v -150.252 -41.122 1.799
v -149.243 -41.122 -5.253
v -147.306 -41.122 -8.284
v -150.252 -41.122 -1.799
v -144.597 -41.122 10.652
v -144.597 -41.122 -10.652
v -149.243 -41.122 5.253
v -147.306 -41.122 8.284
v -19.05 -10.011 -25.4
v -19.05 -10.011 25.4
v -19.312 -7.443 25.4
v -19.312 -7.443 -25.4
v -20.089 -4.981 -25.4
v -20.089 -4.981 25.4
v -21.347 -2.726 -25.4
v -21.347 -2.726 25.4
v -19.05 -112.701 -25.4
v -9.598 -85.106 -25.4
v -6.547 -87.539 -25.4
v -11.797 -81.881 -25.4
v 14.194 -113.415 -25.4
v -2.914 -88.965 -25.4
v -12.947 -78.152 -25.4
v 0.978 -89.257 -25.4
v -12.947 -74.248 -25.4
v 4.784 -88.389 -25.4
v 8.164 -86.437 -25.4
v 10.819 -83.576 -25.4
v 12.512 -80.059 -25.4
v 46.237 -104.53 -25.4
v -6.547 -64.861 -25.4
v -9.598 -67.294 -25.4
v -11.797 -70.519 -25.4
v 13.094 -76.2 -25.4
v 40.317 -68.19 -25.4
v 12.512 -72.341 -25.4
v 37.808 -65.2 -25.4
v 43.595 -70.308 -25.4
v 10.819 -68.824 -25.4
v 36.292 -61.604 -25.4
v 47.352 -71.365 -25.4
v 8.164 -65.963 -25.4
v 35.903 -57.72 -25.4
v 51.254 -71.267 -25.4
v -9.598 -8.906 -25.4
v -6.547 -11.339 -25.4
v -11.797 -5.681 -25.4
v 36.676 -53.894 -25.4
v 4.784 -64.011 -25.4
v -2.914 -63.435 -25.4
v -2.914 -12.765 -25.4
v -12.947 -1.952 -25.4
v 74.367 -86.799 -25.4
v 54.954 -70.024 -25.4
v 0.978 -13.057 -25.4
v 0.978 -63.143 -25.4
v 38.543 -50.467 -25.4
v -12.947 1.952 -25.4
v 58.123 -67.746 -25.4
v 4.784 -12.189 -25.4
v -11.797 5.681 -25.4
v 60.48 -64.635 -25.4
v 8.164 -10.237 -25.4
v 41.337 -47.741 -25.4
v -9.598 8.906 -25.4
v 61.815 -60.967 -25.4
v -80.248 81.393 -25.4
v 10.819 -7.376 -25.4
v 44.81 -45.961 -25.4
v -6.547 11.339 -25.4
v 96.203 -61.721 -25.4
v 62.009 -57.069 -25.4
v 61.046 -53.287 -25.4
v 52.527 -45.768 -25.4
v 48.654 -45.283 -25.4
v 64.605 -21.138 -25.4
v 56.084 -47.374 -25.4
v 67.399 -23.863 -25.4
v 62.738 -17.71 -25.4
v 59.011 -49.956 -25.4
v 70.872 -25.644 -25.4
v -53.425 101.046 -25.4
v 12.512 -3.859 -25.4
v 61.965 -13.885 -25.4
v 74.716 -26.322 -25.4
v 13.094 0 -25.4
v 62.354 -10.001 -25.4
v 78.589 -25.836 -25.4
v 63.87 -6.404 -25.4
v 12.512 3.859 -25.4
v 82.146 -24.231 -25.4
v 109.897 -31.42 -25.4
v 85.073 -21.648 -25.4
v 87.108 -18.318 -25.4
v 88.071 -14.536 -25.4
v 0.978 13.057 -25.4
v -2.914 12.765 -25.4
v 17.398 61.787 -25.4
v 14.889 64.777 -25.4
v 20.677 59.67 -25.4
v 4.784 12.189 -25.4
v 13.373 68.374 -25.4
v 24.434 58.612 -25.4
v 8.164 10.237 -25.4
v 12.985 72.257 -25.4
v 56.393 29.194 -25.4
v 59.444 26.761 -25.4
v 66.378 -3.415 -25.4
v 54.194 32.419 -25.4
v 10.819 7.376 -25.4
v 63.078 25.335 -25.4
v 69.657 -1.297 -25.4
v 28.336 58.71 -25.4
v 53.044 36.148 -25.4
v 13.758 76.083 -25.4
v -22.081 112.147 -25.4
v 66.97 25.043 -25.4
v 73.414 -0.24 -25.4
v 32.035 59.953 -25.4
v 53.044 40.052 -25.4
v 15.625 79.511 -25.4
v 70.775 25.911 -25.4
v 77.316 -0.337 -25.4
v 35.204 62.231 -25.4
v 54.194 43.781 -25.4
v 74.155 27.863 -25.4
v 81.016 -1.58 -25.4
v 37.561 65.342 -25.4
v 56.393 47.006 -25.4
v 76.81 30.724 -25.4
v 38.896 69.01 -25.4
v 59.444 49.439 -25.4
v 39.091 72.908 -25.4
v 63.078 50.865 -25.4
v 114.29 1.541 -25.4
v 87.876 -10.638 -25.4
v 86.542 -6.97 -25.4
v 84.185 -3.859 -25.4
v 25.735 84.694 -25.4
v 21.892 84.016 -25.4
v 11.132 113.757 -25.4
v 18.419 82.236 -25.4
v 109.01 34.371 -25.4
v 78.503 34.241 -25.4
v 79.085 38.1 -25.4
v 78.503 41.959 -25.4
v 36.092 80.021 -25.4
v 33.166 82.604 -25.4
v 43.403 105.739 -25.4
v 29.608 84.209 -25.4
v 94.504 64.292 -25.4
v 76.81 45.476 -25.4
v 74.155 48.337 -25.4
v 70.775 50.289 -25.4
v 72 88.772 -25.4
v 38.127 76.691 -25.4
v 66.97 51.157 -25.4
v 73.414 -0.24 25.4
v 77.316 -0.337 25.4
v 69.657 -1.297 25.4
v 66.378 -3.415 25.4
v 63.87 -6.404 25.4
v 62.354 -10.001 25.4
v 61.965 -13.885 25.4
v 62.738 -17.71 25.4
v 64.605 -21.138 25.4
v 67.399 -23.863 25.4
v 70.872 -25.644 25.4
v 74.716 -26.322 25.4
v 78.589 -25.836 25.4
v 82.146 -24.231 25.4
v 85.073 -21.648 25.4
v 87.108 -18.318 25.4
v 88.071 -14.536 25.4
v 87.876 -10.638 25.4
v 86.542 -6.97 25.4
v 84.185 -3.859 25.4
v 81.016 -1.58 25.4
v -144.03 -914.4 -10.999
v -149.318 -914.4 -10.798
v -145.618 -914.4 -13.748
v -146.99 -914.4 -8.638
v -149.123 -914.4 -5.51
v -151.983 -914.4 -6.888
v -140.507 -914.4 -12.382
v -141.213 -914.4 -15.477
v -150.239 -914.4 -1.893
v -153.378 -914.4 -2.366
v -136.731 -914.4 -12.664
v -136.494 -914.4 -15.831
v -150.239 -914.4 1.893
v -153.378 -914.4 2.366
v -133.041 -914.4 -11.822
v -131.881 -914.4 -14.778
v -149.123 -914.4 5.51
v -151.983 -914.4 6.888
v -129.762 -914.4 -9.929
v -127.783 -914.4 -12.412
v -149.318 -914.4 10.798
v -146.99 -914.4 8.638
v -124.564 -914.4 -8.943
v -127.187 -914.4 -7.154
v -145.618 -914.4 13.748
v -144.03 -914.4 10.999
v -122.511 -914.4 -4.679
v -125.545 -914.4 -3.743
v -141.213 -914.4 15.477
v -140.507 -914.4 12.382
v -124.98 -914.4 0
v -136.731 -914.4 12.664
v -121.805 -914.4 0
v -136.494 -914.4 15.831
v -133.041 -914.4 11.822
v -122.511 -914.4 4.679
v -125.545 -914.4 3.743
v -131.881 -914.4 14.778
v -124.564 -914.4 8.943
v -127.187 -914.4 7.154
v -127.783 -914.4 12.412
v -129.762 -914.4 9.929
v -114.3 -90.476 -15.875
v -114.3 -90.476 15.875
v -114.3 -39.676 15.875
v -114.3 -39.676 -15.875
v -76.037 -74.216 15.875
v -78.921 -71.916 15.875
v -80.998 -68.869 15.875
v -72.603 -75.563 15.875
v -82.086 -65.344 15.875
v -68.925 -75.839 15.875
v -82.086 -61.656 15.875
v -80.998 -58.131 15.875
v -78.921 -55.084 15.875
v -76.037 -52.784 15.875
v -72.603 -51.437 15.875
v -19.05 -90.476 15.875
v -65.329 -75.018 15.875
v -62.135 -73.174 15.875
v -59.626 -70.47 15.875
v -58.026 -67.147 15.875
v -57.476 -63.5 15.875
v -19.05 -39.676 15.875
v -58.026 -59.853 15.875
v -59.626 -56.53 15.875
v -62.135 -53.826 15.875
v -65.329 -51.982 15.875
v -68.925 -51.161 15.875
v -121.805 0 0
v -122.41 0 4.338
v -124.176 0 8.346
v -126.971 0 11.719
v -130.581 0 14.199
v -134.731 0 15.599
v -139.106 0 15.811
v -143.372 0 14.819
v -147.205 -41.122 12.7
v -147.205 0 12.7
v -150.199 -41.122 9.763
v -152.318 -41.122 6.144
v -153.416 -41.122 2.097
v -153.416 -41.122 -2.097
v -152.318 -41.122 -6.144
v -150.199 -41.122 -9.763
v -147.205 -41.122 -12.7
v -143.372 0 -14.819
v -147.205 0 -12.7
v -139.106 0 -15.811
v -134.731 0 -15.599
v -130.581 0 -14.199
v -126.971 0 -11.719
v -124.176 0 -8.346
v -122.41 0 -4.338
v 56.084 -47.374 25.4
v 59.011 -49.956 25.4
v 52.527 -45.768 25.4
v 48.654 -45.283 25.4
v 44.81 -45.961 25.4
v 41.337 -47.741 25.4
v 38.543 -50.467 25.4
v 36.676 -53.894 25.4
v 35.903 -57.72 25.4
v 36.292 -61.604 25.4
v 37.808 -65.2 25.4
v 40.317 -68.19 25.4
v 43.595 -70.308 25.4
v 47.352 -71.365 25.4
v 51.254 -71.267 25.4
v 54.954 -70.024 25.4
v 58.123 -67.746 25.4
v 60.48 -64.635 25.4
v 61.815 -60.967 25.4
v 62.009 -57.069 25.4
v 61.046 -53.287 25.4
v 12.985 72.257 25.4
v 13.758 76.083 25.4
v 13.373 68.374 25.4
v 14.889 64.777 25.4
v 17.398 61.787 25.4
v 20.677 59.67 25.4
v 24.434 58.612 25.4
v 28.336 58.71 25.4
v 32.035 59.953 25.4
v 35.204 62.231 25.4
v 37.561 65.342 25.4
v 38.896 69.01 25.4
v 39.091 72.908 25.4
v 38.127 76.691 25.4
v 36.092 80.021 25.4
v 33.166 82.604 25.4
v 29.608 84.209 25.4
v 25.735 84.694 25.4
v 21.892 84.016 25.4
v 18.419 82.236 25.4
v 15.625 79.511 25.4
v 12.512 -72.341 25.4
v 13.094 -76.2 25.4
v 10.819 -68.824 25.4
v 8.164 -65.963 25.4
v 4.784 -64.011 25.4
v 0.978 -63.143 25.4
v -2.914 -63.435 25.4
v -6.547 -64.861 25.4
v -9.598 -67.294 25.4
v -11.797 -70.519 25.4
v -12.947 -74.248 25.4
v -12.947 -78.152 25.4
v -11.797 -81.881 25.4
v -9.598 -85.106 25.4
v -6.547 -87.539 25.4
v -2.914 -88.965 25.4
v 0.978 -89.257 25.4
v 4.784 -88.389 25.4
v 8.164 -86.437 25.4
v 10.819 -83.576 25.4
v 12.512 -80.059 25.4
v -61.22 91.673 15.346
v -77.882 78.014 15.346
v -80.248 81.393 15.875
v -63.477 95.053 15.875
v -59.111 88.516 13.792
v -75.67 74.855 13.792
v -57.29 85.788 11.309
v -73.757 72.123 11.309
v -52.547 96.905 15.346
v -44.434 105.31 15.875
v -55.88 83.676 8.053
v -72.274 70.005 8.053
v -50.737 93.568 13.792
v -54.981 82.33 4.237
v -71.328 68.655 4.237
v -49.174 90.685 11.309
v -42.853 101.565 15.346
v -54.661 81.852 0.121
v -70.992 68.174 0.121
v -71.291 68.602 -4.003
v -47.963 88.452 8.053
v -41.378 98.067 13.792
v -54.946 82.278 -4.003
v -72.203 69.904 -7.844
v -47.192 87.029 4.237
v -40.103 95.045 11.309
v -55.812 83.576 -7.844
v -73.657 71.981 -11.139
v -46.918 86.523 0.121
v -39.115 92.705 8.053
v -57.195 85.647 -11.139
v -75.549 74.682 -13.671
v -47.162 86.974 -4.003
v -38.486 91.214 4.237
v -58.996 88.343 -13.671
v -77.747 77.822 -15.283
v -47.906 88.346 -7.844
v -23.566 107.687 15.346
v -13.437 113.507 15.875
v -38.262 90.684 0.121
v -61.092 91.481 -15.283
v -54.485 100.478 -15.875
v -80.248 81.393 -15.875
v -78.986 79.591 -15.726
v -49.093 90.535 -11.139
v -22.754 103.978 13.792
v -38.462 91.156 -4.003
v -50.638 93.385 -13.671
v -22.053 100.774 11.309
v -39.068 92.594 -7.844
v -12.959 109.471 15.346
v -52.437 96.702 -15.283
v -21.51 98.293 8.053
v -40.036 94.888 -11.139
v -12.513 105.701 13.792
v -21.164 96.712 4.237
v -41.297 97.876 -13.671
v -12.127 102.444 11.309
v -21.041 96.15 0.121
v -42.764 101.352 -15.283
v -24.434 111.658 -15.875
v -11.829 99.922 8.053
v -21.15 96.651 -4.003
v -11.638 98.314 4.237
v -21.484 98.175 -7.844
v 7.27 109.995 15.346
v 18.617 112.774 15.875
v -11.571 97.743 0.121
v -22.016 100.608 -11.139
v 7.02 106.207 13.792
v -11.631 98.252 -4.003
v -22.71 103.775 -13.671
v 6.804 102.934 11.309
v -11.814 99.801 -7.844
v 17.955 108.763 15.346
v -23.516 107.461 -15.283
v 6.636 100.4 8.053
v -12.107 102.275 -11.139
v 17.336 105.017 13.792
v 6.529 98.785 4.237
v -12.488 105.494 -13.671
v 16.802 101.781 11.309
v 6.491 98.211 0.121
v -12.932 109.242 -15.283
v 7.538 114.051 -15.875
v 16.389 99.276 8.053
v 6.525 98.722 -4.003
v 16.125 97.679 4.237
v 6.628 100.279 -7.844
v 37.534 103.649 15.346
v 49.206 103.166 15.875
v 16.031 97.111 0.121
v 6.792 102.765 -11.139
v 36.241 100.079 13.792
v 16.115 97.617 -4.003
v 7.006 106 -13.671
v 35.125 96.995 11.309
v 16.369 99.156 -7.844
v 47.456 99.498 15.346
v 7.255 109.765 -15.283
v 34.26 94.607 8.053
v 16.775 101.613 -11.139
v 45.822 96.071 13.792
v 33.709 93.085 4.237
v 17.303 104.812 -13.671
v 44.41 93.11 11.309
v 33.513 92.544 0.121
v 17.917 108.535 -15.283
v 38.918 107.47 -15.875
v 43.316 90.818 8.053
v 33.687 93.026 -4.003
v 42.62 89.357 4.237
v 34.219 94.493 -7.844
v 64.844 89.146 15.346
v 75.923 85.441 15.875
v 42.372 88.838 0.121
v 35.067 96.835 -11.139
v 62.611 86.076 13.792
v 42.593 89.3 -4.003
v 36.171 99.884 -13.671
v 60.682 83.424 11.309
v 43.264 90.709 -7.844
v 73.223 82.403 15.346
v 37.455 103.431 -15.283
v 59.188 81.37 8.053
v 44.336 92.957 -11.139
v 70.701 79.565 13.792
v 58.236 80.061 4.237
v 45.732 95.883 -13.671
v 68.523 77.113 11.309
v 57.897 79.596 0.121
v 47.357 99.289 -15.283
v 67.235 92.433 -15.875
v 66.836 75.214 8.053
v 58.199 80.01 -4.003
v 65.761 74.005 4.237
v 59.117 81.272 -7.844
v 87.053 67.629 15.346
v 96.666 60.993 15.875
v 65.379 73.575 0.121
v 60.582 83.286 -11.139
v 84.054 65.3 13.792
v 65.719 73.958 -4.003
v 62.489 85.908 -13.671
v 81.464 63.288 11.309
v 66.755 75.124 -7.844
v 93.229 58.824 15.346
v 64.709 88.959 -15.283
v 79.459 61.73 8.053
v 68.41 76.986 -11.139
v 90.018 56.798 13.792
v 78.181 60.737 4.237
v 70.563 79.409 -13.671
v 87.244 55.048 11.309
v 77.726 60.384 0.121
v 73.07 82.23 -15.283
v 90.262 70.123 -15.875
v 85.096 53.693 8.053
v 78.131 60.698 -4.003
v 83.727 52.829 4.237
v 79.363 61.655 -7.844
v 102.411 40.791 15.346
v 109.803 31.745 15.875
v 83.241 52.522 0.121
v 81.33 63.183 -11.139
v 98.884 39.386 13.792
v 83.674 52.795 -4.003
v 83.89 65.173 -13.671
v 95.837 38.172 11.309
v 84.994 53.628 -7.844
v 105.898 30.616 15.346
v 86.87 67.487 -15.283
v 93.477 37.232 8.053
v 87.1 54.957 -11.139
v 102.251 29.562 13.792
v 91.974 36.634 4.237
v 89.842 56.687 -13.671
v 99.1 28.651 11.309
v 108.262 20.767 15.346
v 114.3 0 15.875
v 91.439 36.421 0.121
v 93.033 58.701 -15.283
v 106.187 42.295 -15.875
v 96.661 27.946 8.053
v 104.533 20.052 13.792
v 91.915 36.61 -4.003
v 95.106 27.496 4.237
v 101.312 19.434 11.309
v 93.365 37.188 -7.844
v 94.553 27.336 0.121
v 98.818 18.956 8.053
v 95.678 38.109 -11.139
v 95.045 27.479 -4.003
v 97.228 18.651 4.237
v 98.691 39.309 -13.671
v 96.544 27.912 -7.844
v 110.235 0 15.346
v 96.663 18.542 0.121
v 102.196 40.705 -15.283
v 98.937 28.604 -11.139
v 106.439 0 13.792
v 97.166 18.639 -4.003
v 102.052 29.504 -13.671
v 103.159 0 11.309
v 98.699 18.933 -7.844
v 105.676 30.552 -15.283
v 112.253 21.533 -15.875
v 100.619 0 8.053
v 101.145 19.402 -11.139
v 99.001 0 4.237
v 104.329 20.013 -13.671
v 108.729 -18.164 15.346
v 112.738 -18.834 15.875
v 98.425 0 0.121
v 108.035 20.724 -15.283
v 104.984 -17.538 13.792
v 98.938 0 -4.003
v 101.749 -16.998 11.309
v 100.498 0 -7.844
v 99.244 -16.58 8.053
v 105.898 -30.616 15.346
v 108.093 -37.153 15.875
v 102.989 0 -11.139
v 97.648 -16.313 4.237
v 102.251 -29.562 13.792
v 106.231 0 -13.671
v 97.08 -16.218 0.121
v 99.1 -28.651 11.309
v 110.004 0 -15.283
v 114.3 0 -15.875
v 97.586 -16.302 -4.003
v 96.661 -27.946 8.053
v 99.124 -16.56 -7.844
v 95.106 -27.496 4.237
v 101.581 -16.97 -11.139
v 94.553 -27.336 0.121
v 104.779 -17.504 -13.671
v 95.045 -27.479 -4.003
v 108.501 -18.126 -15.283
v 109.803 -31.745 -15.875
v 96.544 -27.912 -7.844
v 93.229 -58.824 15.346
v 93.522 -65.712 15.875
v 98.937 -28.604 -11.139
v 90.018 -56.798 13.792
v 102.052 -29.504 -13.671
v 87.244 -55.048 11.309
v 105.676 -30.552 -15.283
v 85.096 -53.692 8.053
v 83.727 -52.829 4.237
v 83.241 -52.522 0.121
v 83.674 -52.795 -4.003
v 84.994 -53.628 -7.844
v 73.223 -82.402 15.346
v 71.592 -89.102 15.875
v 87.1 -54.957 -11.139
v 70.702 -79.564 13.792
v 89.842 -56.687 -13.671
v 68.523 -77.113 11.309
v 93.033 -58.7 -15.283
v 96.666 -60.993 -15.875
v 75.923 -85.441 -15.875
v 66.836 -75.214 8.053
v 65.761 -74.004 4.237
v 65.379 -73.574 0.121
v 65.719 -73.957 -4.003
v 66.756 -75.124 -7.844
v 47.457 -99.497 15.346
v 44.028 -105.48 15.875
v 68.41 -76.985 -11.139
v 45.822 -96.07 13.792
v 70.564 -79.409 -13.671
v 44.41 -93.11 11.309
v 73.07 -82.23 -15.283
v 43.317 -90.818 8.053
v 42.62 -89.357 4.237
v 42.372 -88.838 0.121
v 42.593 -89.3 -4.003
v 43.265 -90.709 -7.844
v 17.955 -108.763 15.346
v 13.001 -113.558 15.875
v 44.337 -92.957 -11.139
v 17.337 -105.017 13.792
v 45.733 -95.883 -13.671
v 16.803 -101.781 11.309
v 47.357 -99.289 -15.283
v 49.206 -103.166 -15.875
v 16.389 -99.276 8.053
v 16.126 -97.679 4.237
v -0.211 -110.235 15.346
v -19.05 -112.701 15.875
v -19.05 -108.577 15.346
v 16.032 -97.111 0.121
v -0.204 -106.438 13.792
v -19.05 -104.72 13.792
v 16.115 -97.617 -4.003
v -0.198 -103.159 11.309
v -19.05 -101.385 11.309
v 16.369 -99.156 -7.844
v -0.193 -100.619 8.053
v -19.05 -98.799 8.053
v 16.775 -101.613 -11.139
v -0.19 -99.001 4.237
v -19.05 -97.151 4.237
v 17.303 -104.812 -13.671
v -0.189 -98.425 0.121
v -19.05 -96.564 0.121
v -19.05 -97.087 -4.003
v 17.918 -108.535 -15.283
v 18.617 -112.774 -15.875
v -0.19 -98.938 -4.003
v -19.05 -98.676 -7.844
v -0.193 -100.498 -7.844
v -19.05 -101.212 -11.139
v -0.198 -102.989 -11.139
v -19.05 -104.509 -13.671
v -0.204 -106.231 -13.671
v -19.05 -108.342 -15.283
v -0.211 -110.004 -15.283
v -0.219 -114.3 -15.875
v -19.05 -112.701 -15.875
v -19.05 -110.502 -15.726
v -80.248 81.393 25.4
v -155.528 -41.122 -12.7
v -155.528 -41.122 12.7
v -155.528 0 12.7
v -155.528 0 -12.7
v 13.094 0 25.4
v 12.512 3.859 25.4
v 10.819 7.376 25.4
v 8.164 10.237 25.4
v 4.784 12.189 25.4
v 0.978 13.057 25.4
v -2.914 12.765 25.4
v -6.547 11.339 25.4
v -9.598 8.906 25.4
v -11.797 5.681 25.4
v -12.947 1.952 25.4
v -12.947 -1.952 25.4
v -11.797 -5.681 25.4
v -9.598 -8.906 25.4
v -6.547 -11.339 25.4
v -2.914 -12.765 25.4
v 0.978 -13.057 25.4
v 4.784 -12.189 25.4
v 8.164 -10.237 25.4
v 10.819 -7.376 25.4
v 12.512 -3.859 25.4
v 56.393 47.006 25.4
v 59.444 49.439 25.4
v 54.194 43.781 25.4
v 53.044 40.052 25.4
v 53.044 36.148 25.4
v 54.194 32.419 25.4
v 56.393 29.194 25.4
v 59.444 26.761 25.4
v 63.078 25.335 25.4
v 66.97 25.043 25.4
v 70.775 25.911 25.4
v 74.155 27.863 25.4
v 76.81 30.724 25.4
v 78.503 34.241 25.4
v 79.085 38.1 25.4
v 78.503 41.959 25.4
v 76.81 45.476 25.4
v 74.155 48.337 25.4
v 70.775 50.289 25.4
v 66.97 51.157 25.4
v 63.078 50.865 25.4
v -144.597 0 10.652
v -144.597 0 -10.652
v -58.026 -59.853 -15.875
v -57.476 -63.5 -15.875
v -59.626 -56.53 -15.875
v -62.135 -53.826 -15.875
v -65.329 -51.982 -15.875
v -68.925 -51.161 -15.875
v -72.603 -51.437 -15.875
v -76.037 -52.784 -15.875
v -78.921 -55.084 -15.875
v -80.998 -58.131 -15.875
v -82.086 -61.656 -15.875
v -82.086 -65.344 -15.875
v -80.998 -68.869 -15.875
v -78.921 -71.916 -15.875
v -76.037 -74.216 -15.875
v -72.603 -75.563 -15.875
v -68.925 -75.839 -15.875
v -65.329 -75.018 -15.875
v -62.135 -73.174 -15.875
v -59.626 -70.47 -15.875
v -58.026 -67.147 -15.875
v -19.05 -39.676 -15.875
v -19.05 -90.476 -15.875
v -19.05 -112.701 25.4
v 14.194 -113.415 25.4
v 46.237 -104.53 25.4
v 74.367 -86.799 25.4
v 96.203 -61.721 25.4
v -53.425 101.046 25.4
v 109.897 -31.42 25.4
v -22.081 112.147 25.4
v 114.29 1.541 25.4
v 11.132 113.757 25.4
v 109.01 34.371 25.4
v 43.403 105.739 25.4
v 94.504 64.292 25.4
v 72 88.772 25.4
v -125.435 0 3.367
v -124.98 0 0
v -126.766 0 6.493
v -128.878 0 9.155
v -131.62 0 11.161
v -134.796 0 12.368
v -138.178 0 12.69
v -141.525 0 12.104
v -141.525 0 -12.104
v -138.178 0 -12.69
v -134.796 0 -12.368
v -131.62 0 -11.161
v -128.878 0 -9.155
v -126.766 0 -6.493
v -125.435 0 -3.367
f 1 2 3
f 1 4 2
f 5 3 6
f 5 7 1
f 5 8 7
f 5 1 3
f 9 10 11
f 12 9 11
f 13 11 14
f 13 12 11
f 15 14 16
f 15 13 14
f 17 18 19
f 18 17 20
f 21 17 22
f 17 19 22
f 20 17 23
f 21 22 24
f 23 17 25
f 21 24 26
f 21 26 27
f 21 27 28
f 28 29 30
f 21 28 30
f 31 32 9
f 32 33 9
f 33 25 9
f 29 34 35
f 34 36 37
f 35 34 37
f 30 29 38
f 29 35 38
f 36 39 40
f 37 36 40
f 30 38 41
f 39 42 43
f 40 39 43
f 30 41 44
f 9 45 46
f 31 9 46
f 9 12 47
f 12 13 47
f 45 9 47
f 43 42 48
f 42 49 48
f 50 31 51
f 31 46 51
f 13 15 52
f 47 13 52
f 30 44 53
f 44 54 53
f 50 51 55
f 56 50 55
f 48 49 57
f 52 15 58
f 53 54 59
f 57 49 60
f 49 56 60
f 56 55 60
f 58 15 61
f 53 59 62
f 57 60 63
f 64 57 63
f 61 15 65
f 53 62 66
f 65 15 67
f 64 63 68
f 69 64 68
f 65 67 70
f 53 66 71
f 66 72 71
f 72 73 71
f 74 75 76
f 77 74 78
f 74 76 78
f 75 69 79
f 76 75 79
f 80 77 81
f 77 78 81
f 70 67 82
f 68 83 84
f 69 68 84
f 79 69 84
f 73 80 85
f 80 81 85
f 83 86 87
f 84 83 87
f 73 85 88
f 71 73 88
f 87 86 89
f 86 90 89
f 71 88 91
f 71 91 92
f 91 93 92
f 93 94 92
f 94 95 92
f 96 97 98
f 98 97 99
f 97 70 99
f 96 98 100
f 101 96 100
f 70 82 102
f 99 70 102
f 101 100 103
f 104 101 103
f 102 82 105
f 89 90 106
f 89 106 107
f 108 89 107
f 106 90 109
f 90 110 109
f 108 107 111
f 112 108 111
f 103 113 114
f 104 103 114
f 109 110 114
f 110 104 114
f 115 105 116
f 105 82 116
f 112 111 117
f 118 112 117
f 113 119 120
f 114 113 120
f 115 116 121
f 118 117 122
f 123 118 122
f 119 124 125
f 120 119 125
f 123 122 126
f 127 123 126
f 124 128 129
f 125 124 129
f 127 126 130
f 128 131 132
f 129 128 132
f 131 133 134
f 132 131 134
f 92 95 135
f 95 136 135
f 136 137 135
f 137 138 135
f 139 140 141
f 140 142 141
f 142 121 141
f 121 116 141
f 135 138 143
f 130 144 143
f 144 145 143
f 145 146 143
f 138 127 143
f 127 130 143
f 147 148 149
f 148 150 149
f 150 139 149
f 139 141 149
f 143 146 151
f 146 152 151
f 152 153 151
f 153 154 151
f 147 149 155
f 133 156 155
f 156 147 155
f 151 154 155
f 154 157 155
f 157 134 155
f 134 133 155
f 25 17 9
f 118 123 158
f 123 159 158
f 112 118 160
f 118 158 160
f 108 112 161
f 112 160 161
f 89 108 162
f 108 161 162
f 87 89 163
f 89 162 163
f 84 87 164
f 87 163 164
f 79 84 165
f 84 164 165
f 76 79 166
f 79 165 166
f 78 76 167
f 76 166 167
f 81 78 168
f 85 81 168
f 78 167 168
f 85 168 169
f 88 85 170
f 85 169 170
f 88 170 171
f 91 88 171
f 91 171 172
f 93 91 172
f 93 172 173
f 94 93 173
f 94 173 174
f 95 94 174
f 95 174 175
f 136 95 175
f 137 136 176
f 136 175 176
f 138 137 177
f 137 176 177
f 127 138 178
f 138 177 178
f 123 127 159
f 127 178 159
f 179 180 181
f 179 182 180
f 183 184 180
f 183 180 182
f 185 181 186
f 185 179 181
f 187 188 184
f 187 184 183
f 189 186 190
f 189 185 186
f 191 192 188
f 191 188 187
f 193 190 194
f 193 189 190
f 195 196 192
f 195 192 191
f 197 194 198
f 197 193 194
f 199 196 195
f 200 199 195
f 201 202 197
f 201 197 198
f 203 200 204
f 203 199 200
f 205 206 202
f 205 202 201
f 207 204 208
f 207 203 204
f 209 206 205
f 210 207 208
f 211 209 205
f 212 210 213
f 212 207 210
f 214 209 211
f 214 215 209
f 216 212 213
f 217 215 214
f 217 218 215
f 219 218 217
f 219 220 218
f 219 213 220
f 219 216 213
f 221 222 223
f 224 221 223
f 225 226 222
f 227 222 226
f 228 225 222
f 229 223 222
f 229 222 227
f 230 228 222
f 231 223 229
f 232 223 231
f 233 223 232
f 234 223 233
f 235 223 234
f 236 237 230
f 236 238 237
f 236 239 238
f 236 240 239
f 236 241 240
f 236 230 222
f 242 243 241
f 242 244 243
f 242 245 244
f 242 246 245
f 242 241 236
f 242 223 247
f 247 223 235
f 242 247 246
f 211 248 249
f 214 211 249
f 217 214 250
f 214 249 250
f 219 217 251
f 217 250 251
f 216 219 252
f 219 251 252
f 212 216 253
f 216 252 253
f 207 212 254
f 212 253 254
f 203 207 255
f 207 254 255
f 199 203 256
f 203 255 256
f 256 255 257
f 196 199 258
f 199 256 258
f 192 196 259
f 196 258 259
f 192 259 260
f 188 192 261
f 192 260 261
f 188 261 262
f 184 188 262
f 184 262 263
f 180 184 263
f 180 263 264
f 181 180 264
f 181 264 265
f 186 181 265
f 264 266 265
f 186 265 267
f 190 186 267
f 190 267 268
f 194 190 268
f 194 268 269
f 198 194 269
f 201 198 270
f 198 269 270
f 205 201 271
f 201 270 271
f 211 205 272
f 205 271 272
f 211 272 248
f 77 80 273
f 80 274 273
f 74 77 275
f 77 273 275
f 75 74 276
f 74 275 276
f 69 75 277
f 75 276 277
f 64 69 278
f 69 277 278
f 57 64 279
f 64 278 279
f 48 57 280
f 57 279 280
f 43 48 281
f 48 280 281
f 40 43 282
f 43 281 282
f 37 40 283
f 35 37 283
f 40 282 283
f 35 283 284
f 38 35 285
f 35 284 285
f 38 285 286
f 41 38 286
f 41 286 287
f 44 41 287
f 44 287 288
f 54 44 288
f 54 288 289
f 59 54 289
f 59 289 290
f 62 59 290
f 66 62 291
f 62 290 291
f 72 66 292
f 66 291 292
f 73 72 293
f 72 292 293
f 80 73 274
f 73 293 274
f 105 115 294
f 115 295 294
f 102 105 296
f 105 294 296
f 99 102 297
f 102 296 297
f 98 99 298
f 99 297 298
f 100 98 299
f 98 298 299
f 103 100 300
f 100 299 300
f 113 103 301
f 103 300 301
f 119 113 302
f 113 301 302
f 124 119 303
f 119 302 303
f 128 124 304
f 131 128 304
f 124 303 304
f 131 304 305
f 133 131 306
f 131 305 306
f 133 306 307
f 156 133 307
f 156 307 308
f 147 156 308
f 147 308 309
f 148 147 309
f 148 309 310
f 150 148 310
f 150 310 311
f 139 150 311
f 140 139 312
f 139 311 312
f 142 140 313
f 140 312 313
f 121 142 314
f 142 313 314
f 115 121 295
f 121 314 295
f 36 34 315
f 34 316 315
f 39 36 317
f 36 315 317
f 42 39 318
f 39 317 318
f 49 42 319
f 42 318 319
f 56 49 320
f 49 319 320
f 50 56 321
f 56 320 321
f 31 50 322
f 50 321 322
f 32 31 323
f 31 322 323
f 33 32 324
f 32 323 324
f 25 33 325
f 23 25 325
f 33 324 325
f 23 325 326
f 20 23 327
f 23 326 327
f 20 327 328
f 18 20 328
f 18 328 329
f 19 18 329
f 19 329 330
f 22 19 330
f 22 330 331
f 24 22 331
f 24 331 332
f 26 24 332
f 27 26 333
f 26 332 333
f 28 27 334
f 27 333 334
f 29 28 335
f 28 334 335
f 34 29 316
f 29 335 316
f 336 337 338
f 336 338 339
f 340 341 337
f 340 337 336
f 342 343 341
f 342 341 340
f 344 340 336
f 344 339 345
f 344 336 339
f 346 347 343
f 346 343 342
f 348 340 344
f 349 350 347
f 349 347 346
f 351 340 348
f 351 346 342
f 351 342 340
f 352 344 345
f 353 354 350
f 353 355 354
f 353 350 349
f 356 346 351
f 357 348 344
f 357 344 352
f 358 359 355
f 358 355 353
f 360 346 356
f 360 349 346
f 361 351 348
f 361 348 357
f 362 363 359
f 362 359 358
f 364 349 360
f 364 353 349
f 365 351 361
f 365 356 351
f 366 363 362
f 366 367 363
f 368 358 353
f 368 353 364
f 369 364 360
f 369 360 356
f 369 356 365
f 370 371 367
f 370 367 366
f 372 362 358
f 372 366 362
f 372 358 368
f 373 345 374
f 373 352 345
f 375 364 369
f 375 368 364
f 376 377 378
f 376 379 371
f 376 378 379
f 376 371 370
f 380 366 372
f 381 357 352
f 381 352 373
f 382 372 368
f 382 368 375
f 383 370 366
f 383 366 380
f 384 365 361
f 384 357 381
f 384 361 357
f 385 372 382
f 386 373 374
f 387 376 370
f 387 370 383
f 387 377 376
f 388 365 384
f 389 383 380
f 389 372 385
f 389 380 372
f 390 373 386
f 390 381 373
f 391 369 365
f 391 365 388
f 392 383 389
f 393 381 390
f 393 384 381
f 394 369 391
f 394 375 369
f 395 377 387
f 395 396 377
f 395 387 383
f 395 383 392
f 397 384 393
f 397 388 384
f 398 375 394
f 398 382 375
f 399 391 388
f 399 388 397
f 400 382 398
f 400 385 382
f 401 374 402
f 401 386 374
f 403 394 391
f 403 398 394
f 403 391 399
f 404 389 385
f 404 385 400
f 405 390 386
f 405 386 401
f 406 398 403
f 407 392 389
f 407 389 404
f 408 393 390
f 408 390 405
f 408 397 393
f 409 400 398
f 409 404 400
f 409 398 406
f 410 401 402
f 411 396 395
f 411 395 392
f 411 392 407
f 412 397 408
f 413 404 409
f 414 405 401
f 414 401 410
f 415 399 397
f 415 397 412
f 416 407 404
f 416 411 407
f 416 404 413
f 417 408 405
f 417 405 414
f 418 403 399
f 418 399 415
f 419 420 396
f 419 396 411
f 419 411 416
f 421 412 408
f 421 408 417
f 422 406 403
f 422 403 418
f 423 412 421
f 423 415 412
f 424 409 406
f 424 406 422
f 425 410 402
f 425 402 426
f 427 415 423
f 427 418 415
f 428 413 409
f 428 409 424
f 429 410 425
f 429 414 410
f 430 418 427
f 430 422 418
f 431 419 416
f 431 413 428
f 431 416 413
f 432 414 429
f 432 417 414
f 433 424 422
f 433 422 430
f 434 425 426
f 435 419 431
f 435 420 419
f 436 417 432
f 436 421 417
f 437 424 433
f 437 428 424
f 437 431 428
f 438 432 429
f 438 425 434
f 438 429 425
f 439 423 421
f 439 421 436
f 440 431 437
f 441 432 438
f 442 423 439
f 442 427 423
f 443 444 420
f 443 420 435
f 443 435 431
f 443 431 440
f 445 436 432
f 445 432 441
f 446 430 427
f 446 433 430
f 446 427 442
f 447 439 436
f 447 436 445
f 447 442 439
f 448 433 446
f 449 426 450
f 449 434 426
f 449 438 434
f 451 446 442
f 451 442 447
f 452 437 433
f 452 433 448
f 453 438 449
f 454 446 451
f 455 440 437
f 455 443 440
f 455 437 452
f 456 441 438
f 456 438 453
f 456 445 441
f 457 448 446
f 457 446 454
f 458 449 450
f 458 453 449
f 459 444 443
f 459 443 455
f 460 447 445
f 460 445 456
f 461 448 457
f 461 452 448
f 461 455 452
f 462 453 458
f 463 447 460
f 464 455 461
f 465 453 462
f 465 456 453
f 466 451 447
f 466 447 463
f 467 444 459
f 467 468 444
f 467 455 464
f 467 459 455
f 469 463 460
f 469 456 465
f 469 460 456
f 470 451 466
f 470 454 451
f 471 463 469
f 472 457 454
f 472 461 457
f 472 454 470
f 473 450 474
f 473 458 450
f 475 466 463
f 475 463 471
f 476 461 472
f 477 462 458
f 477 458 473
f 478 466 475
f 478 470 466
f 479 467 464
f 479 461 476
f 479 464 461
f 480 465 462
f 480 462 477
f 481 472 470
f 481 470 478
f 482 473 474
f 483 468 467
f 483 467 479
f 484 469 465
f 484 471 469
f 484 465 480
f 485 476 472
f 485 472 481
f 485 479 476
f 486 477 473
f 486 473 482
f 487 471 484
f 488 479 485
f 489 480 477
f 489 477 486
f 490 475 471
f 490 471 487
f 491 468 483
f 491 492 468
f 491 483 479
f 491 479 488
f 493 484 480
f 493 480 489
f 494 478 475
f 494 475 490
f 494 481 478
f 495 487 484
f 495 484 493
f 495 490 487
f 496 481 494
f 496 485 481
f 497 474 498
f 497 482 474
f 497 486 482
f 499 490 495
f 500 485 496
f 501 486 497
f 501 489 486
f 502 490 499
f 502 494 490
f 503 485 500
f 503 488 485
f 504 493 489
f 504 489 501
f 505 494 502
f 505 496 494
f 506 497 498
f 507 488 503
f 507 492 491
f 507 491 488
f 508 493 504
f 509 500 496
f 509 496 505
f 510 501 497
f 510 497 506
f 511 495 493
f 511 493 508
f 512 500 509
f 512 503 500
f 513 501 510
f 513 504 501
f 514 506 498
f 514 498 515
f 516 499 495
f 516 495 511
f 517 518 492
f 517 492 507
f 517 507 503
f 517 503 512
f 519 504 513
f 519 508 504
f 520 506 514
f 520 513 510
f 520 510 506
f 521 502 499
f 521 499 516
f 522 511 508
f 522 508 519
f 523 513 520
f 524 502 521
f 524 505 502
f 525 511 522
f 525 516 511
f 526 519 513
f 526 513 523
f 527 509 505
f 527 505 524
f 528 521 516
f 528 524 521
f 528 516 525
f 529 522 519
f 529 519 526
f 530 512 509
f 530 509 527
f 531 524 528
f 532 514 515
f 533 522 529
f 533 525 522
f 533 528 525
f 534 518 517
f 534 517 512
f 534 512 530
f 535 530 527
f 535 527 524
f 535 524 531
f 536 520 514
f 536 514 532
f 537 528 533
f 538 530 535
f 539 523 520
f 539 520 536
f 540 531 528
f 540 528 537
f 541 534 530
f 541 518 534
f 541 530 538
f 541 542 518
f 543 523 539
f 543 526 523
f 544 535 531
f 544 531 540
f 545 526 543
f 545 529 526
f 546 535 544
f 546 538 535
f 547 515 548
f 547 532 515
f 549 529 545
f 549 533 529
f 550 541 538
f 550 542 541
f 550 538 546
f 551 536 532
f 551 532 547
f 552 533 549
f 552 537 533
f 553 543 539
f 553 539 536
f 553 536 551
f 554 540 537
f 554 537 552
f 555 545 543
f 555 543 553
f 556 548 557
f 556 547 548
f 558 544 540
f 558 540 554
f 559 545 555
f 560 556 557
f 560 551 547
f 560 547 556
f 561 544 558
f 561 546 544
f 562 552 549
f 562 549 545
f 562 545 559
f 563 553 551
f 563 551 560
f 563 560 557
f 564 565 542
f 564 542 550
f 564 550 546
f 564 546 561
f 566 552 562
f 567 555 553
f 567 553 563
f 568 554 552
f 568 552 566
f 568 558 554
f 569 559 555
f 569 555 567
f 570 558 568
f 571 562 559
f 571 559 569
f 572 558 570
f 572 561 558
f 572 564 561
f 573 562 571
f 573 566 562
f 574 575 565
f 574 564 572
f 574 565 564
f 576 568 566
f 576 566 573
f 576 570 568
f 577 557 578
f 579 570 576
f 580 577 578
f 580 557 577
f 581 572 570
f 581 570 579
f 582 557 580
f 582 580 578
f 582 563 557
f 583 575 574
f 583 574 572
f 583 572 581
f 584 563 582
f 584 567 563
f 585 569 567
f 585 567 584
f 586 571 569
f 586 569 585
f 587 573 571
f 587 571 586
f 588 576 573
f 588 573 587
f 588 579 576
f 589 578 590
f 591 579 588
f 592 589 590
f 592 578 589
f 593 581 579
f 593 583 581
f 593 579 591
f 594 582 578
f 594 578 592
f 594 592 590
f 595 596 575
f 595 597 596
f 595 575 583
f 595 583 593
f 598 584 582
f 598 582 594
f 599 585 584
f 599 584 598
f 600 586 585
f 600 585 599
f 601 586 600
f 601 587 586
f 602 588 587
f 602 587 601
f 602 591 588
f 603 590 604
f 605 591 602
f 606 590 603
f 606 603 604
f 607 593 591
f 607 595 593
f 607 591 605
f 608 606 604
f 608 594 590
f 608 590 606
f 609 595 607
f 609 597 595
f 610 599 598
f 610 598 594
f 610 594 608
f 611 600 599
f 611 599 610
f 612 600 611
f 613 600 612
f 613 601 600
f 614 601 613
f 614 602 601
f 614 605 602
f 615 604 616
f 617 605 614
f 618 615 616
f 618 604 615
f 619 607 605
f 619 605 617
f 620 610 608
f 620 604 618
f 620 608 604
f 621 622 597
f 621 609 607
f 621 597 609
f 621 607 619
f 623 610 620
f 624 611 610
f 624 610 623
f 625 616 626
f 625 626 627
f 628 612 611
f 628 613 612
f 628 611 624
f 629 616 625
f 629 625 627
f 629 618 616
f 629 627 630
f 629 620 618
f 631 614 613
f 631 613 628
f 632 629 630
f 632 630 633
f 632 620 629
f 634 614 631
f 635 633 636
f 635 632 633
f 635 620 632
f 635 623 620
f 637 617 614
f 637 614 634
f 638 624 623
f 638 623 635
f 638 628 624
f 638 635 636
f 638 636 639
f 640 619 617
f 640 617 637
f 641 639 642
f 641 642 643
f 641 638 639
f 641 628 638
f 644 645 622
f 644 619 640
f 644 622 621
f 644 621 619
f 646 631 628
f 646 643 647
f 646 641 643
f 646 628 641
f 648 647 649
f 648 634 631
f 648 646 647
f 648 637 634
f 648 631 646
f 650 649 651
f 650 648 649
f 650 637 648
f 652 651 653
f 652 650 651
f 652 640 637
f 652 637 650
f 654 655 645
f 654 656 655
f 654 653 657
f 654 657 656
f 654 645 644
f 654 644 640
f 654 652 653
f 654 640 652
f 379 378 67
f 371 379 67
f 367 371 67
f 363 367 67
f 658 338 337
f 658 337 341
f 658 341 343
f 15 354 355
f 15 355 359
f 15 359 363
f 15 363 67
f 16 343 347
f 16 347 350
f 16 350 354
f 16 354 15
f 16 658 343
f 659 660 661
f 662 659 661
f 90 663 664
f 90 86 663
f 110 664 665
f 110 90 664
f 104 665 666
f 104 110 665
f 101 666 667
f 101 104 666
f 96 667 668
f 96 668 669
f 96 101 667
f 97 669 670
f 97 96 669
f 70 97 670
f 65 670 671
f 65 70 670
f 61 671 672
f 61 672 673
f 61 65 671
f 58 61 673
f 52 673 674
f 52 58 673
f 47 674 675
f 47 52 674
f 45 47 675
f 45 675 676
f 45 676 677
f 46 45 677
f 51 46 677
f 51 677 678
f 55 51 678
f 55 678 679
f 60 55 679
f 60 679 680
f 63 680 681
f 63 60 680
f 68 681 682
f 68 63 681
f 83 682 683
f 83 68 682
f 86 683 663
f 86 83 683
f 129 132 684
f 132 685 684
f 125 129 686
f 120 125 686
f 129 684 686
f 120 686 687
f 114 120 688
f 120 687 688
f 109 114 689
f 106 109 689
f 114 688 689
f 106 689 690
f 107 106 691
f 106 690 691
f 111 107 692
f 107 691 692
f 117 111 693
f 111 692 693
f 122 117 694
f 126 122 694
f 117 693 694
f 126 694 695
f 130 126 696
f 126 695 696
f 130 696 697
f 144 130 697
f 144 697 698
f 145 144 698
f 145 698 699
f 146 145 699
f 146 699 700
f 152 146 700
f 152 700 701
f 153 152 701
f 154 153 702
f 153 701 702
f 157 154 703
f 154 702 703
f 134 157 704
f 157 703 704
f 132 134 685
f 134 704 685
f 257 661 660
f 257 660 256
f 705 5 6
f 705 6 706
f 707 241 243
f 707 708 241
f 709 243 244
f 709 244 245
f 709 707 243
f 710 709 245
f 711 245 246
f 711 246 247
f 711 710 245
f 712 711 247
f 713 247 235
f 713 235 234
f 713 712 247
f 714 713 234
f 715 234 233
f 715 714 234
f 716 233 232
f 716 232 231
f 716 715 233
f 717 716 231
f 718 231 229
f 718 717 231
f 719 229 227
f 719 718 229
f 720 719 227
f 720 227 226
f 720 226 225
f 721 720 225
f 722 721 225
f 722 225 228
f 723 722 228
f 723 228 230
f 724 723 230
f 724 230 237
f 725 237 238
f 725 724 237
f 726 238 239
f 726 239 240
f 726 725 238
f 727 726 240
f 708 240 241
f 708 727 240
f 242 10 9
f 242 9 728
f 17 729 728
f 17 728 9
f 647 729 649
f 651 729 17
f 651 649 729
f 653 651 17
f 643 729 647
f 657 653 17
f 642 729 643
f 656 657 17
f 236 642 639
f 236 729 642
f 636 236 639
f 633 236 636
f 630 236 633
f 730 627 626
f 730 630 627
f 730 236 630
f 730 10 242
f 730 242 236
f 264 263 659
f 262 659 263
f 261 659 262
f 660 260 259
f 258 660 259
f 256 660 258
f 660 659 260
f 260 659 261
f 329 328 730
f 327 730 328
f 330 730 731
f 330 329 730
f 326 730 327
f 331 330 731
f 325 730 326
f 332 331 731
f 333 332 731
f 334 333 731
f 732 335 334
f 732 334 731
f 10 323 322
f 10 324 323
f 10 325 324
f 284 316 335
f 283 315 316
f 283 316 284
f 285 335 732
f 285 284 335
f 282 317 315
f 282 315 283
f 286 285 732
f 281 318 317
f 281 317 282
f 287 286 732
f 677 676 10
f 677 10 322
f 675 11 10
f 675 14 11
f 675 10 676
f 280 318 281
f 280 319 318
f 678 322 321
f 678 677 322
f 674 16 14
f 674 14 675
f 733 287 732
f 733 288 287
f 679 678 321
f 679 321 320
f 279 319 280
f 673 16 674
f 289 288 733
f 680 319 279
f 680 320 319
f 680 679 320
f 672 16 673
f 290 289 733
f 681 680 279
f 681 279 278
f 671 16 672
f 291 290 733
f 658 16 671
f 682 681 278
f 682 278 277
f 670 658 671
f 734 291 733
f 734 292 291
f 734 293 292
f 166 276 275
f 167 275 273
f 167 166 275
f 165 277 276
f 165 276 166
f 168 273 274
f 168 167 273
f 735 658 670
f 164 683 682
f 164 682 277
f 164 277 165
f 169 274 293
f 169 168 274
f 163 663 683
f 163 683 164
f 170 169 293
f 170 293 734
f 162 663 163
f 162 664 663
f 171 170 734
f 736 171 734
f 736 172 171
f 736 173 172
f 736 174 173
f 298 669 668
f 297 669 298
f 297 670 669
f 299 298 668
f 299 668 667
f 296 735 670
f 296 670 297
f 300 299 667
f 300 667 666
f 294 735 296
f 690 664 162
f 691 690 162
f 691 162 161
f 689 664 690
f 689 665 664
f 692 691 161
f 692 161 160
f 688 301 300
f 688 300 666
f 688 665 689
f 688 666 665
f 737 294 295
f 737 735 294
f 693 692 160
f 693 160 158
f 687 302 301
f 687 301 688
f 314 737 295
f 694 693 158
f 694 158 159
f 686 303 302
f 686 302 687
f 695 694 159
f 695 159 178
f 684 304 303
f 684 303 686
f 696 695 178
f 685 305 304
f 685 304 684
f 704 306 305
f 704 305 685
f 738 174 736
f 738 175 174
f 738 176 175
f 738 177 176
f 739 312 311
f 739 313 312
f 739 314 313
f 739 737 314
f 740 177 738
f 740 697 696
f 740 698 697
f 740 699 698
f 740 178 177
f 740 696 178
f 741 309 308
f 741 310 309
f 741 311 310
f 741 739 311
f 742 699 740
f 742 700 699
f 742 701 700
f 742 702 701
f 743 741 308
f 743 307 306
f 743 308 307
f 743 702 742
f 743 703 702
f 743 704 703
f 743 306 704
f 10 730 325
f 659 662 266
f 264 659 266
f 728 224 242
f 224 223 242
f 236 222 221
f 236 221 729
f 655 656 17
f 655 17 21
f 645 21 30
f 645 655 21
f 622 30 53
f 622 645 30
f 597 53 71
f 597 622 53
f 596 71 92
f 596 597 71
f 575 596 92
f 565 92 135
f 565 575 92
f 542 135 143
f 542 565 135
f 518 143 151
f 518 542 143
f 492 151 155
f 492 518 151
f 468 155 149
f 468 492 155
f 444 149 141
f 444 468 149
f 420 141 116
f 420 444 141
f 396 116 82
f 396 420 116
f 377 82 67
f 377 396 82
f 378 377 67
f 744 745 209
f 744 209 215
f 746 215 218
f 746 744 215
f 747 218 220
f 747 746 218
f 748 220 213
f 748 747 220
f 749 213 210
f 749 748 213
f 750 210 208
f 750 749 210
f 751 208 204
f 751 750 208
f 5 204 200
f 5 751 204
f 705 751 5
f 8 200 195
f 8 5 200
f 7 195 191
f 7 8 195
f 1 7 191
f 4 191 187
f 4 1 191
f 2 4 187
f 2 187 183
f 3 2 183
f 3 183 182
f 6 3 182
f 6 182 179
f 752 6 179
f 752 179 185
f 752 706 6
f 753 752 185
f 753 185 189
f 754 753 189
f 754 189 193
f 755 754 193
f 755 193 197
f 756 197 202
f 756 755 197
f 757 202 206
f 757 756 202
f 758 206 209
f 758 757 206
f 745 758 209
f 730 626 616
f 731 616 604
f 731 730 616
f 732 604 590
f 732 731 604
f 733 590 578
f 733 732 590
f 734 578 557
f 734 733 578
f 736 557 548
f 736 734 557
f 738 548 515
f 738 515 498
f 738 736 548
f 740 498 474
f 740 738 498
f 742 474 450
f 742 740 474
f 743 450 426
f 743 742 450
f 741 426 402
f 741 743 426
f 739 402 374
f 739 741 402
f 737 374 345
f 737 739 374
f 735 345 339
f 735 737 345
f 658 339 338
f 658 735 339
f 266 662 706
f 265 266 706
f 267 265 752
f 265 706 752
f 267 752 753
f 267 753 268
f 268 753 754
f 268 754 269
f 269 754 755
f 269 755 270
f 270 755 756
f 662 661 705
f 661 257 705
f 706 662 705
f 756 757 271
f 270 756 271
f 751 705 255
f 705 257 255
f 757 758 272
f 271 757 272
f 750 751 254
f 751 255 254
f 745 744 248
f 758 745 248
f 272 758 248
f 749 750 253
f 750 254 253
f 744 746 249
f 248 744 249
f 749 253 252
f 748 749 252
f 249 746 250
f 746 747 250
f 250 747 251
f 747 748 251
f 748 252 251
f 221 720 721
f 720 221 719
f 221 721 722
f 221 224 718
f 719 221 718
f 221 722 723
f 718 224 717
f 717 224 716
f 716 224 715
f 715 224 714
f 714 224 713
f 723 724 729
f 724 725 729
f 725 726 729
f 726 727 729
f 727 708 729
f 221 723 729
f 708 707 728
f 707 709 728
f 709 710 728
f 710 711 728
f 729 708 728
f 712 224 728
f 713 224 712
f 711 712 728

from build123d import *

# Parameters (mm, degrees)
F0_R            = 13.0937
F1_DEPTH        = 25.4
F3_R            = 13.0937
F4_DEPTH        = 63.5
F4_COPIES_COUNT = 5
F4_COPIES_ANGLE = 160
F5_R            = 15.875
F7_W            = 95.25
F7_H            = 50.8
F7_R            = 12.3737085095
F8_DEPTH        = 15.875
F9_R            = 12.7
F10_R           = 15.875
F10_R_2         = 12.7
F11_DEPTH       = 914.4
F12_W           = 10.9309703112
F12_H           = 41.1224626005
F13_DEPTH       = 12.7


# Not quite as in the source:
# - a pattern or mirror of a feature is missing from the dataset's text; its kind, count and spacing are read off the source's solid


with BuildPart() as f1:
    # F0 (on Top) → F1 (new body, symmetric)
    with BuildSketch(Plane.XY):
        with BuildLine():
            Line((-19.05, -6.0064419281), (-19.05, -112.701319868))
            ThreePointArc((-19.05, -112.701319868), (109.0098474705, 34.3706728833), (-80.2476678657, 81.3928854515))
            Line((-80.2476678657, 81.3928854515), (-19.05, -6.0064419281))
        make_face()
        Circle(F0_R, mode=Mode.SUBTRACT)
    extrude(amount=F1_DEPTH, both=True)

    # F3 (on Top) → F4 (cut, symmetric)
    with BuildSketch(Plane.XY):
        with Locations((0, -76.2)):
            Circle(F3_R)
    f4 = extrude(amount=F4_DEPTH, both=True, mode=Mode.SUBTRACT)

    # F4_copies: F4 ×5 about axis
    f4_copies_axis = Axis((0, 0, 0), (0, 0, 1))
    for i in range(1, F4_COPIES_COUNT):
        add(f4.rotate(f4_copies_axis, i * F4_COPIES_ANGLE / (F4_COPIES_COUNT - 1)), mode=Mode.SUBTRACT)

    # F5 (on Front) → F6 (revolve, cut)
    with BuildSketch(Plane.XZ):
        with Locations((114.3, 0)):
            Circle(F5_R)
    revolve(axis=Axis((0, 0, 0), (0, 0, -1)), mode=Mode.SUBTRACT)

    # F7 (on Top) → F8 (join, symmetric)
    with BuildSketch(Plane.XY):
        with Locations((-66.675, -65.076319868)):
            Rectangle(F7_W, F7_H)
        with Locations((-69.85, -63.5)):
            Circle(F7_R, mode=Mode.SUBTRACT)
    extrude(amount=F8_DEPTH, both=True)

    # F9
    f9_edges = [f1.edges().sort_by_distance(p)[0] for p in [
        (-19.05, -6.006442, 0),
    ]]
    fillet(f9_edges, radius=F9_R)


with BuildPart() as f11:
    # F10 (on Front) → F11 (new body)
    with BuildSketch(Plane.XZ):
        with Locations((-137.6804935392, 0)):
            Circle(F10_R)
        with Locations((-137.6804935392, 0)):
            Circle(F10_R_2, mode=Mode.SUBTRACT)
    extrude(amount=F11_DEPTH)

    # F12 (on Top) → F13 (join, symmetric)
    with BuildSketch(Plane.XY):
        with Locations((-150.0622108579, -20.5612313002)):
            Rectangle(F12_W, F12_H)
    extrude(amount=F13_DEPTH, both=True)


solid = Compound([f1.part, f11.part])
